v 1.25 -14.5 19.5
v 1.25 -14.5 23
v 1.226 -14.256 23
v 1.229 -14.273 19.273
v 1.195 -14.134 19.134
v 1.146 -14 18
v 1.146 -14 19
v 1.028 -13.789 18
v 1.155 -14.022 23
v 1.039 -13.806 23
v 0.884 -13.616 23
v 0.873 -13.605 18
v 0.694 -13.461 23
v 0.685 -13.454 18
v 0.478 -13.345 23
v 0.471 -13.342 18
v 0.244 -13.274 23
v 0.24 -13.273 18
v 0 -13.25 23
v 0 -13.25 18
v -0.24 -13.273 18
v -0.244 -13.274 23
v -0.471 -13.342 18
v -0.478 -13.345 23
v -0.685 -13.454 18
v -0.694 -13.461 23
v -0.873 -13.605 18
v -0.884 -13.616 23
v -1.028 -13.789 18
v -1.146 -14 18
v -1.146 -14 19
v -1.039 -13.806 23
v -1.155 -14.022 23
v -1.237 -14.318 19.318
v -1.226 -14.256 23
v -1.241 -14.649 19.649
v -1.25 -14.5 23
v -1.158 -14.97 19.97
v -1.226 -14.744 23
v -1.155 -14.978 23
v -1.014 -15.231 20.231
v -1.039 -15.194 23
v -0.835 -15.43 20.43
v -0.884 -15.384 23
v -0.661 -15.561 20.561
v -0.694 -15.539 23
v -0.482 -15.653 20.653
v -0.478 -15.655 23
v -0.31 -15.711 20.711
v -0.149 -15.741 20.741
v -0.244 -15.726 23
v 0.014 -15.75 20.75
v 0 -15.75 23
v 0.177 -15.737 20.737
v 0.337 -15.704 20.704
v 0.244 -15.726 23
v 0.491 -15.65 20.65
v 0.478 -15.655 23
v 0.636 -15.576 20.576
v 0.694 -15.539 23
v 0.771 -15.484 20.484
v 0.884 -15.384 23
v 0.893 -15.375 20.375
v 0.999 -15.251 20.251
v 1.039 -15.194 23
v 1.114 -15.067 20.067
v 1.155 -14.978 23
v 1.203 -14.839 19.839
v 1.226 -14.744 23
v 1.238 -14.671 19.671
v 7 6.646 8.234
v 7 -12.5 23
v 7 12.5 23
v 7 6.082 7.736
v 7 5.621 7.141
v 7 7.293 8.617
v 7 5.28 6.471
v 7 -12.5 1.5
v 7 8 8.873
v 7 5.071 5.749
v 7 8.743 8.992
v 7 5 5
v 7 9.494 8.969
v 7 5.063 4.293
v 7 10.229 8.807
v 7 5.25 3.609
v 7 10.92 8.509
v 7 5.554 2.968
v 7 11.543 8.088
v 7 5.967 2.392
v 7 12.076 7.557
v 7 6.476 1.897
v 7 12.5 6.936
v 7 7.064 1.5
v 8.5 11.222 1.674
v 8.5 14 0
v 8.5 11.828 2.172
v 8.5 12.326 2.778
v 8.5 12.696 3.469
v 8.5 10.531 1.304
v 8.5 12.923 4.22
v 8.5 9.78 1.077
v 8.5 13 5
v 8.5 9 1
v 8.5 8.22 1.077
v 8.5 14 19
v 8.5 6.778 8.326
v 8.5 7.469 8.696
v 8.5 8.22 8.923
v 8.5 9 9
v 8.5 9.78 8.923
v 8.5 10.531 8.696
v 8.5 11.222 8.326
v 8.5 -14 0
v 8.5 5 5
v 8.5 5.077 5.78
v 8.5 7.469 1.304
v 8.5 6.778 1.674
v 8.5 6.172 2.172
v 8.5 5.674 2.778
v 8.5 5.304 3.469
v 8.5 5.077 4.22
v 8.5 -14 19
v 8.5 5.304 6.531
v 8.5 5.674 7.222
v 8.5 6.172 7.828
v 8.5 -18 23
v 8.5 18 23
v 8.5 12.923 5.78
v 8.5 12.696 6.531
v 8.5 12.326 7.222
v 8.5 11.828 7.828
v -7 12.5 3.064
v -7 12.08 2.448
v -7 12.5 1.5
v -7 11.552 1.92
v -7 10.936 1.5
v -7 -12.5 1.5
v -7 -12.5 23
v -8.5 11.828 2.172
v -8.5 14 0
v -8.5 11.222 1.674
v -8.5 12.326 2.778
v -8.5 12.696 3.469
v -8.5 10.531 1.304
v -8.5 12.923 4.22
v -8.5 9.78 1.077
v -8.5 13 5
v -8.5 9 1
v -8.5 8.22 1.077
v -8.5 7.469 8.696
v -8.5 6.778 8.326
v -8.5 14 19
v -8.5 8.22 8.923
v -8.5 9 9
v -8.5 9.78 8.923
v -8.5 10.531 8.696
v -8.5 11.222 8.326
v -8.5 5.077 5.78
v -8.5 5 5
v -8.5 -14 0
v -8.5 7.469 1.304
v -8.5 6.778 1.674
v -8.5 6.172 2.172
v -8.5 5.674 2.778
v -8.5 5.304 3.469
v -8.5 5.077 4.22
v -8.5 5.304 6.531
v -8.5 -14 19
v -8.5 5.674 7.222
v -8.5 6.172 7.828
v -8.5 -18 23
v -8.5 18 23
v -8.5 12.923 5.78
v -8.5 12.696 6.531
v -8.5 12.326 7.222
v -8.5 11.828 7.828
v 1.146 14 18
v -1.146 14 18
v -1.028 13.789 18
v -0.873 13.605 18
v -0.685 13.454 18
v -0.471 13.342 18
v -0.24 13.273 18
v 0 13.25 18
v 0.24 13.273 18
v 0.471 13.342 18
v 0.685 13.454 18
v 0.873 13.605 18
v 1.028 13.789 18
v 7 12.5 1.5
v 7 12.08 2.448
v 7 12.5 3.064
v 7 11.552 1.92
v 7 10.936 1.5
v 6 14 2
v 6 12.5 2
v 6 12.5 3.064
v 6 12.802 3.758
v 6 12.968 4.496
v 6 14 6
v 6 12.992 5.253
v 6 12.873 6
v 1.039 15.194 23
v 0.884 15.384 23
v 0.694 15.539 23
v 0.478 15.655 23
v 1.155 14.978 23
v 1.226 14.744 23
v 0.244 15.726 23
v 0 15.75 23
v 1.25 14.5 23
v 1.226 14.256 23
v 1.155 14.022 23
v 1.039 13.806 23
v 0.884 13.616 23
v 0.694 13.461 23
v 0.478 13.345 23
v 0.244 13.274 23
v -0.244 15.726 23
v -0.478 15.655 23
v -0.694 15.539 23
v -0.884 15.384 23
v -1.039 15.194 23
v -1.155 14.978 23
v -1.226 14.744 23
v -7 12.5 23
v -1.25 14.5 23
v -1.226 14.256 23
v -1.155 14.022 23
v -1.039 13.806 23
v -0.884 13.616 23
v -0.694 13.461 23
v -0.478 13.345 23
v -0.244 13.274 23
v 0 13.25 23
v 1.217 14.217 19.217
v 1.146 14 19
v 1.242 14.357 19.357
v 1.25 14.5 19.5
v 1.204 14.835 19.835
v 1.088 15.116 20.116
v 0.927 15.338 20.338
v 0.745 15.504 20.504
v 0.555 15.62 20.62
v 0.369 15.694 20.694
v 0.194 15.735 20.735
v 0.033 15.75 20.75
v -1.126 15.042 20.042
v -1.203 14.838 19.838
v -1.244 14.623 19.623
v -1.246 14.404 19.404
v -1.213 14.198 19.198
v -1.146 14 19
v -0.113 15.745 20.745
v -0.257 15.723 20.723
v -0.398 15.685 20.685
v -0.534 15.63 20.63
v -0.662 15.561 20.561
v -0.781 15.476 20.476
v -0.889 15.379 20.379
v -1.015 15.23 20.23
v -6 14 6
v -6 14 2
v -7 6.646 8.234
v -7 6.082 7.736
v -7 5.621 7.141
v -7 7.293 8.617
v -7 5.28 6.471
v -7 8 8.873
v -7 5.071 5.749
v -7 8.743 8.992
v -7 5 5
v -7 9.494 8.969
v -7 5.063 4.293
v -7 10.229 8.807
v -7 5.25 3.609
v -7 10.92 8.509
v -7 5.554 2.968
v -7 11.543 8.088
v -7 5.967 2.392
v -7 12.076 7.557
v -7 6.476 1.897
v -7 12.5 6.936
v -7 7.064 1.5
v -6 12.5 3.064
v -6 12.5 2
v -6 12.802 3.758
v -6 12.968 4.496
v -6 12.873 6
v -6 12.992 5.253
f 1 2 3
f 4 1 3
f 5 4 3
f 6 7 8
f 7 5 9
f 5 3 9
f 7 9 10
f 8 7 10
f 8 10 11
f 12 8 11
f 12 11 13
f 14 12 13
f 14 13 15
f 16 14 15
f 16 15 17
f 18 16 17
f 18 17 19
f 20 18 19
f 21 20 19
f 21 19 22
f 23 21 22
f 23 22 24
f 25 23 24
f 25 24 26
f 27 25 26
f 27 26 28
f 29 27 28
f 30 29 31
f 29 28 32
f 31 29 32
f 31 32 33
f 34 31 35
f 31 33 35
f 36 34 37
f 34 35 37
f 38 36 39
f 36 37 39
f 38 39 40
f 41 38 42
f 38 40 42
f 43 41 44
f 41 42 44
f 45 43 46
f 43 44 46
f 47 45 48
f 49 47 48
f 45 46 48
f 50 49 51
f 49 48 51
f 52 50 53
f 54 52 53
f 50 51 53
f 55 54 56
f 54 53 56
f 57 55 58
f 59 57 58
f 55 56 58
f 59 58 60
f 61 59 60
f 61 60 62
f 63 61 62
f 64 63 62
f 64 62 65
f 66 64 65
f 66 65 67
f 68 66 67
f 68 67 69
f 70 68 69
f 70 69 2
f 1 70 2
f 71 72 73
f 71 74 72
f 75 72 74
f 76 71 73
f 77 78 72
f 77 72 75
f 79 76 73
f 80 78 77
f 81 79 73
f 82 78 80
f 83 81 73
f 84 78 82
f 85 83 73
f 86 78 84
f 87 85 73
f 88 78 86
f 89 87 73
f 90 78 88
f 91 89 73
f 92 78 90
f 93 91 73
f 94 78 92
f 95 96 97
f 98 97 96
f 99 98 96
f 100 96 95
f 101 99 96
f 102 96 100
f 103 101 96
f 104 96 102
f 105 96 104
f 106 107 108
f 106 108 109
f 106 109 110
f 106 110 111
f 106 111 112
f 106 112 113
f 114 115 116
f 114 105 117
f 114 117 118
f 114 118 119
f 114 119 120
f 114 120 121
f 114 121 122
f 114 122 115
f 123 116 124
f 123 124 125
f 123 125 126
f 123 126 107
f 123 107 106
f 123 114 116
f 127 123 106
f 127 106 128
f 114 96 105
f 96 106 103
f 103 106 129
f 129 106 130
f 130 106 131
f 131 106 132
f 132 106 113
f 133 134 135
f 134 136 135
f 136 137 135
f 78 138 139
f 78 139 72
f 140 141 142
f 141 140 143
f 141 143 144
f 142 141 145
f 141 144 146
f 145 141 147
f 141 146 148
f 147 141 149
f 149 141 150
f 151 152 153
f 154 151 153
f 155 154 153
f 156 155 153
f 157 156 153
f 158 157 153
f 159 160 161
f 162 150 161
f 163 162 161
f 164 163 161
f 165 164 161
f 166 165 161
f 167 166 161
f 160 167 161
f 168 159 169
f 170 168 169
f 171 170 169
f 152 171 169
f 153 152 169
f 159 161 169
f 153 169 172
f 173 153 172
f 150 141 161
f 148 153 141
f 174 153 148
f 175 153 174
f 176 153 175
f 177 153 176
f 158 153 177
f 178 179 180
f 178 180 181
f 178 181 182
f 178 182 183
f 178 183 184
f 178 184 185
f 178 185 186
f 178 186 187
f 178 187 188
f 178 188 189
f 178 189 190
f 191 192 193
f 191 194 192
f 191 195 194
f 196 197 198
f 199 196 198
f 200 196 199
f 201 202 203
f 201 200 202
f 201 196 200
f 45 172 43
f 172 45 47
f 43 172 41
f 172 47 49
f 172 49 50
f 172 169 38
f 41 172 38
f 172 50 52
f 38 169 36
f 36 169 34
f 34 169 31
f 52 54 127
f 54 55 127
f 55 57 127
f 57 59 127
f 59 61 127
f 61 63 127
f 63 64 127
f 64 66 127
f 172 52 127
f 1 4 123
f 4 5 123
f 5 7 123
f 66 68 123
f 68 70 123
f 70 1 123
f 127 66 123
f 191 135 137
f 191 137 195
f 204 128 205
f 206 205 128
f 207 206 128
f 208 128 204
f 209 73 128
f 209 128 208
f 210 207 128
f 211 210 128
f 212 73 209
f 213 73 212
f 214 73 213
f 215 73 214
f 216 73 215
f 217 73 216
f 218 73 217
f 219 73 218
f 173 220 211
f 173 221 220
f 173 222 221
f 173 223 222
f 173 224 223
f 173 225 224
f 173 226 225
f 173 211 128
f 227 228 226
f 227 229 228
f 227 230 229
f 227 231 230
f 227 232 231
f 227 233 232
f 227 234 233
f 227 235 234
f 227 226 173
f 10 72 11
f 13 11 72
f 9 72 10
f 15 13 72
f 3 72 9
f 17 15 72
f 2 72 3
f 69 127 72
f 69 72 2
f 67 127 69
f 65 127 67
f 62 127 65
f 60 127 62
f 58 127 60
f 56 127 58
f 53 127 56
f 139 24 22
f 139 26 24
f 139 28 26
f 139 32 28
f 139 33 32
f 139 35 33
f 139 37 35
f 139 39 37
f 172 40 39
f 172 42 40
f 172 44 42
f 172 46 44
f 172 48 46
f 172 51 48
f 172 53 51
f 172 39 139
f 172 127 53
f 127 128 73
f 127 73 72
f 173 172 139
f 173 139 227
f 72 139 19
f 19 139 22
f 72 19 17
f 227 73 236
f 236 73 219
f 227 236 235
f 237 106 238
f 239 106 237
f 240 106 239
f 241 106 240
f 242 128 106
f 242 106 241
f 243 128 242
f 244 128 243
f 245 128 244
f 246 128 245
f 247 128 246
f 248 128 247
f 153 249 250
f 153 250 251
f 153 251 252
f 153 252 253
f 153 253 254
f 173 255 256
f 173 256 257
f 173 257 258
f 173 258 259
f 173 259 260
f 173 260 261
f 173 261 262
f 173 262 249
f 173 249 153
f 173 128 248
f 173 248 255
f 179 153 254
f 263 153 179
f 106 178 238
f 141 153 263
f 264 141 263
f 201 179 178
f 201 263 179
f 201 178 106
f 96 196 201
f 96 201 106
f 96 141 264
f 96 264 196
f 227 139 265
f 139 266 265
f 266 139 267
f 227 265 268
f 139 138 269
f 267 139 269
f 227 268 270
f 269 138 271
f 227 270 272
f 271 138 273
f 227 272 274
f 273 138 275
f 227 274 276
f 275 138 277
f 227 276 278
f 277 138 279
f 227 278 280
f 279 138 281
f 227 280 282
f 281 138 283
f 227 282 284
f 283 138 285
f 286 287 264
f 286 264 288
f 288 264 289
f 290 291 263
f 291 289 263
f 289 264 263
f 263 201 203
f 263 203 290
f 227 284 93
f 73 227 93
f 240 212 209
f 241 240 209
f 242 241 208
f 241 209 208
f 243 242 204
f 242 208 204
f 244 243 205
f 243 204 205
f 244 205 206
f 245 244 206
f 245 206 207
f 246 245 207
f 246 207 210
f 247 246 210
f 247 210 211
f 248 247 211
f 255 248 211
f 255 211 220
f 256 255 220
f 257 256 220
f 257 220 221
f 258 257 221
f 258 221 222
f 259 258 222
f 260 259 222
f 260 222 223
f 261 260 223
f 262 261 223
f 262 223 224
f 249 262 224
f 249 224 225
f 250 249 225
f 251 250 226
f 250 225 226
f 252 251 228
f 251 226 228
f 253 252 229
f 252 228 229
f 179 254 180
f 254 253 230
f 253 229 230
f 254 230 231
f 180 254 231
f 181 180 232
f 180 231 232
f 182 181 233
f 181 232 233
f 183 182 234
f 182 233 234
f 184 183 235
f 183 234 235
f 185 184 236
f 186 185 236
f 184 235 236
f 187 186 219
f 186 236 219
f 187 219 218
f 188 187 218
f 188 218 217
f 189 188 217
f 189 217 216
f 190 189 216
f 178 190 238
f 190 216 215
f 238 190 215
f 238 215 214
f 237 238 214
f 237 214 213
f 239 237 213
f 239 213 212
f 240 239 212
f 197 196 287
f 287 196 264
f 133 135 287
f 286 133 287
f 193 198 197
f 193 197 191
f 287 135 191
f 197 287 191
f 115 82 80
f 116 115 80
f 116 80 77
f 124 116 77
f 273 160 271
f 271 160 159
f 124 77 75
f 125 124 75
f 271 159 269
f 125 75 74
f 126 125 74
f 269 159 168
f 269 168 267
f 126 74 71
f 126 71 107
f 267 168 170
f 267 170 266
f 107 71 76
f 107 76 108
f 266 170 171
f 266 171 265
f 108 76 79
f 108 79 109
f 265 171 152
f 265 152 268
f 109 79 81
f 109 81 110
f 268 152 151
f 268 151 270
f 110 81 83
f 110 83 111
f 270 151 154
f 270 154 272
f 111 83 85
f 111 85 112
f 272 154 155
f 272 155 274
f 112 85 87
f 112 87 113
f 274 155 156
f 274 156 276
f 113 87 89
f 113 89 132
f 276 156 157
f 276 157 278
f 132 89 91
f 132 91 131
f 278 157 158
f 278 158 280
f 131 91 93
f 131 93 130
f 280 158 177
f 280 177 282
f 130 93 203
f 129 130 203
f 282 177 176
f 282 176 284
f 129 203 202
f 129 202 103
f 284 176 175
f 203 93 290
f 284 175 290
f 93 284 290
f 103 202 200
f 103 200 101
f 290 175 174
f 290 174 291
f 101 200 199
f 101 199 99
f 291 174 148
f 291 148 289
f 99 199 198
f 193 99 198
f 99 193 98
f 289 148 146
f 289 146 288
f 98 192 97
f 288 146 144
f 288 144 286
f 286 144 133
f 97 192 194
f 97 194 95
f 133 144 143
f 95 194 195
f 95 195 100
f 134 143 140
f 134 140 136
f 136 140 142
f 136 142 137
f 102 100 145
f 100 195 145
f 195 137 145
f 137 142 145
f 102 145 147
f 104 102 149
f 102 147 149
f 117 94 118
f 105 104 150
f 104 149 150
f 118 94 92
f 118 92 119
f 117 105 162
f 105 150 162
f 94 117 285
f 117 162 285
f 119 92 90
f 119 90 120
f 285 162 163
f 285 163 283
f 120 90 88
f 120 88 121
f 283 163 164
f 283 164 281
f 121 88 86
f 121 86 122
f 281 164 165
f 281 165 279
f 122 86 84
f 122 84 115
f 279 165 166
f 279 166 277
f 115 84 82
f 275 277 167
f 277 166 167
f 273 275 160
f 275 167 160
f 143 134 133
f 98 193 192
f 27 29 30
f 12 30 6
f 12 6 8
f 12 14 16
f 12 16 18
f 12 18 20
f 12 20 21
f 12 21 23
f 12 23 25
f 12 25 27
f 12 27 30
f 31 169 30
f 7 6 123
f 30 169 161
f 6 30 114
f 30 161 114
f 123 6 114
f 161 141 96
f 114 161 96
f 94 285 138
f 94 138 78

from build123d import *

# Parameters (mm, degrees)
F0_W      = 17
F0_H      = 28
F0_W_2    = 14
F0_H_2    = 25
F1_DEPTH  = 23
F2_DEPTH  = 1.5
F3_W      = 17
F3_H      = 4
F4_DEPTH  = 4
F5_W      = 17
F5_H      = 4
F6_DEPTH  = 4
F5_W_2    = 12
F7_DEPTH  = 1.5
F8_SIZE   = 3.99999
F9_R      = 1.25
F10_DEPTH = 5
F11_R     = 4
F12_DEPTH = 25


# Not quite as in the source:
# - a fillet or chamfer is up to 0.001 mm smaller than in the source, because OpenCascade refuses the exact size


with BuildPart() as f1:
    # F0 (on Top) → F1 (new body)
    with BuildSketch(Plane.XY):
        Rectangle(F0_W, F0_H)
        Rectangle(F0_W_2, F0_H_2, mode=Mode.SUBTRACT)
    extrude(amount=F1_DEPTH)

    # F0 (on Top) → F2 (join)
    with BuildSketch(Plane.XY):
        Rectangle(F0_W_2, F0_H_2)
    extrude(amount=F2_DEPTH)

    # F3 (on face) → F4 (join)
    with BuildSketch(Plane.XZ.offset(14)):
        with Locations((0, 21)):
            Rectangle(F3_W, F3_H)
    extrude(amount=F4_DEPTH)

    # F5 (on face) → F6 (join)
    with BuildSketch(Plane(origin=(0, 14, 0), x_dir=(-1, 0, 0), z_dir=(0, 1, 0))):
        with Locations((0, 21)):
            Rectangle(F5_W, F5_H)
    extrude(amount=F6_DEPTH)

    # F5 (on face) → F7 (cut, through all)
    with BuildSketch(Plane(origin=(0, 14, 0), x_dir=(-1, 0, 0), z_dir=(0, 1, 0))):
        with Locations((0, 4)):
            Rectangle(F5_W_2, F5_H)
    extrude(amount=-F7_DEPTH, mode=Mode.SUBTRACT)

    # F8 (size 4 in the source; OpenCascade refuses exactly that, so slightly less here)
    f8_edges = [f1.edges().sort_by_distance(p)[0] for p in [
        (0, 18, 19),
        (0, -18, 19),
    ]]
    chamfer(f8_edges, length=F8_SIZE)

    # F9 (on face) → F10 (cut)
    with BuildSketch(Plane.XY.offset(23)):
        with Locations((0, 14.5)):
            Circle(F9_R)
        with Locations((0, -14.5)):
            Circle(F9_R)
    extrude(amount=-F10_DEPTH, mode=Mode.SUBTRACT)

    # F11 (on face) → F12 (cut)
    with BuildSketch(Plane(origin=(-8.5, 0, 0), x_dir=(0, -1, 0), z_dir=(-1, 0, 0))):
        with Locations((-9, 5)):
            Circle(F11_R)
    extrude(amount=-F12_DEPTH, mode=Mode.SUBTRACT)


solid = f1.part
